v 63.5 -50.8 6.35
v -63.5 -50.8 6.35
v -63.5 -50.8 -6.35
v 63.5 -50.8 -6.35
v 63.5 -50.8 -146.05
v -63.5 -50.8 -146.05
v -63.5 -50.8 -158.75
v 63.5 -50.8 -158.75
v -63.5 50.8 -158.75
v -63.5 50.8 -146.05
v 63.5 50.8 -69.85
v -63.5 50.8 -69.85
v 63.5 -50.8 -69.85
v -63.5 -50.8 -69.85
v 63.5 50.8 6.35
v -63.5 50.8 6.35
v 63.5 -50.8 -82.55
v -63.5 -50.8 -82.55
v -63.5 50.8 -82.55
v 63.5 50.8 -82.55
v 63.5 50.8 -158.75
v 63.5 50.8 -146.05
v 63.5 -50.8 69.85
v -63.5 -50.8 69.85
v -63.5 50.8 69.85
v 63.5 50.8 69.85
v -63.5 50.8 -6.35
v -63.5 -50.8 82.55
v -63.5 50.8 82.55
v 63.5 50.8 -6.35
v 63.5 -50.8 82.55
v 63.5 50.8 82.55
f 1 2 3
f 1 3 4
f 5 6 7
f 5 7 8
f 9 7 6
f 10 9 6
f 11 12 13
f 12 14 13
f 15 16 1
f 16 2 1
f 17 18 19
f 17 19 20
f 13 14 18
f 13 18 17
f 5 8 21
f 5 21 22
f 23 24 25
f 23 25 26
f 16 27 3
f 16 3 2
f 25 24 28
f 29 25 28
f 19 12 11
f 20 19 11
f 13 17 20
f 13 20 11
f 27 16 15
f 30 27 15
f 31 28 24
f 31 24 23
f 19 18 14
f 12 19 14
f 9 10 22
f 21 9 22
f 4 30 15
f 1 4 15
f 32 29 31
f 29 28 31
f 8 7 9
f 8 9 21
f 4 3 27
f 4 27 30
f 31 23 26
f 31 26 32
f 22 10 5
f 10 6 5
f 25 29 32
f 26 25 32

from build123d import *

# Parameters (mm, degrees)
F0_W     = 127
F0_H     = 12.7
F1_DEPTH = 50.8


# Not quite as in the source:
# - the program builds the solid bodies; features that only make, move or delete a surface that nothing else refers to are left out


with BuildPart() as f1:
    # F0 (on Front) → F1 (new body, symmetric)
    with BuildSketch(Plane.XZ):
        with Locations((0, 76.2)):
            Rectangle(F0_W, F0_H)
    extrude(amount=F1_DEPTH, both=True)


with BuildPart() as f1b:
    # F0 (on Front) → F1, piece 2 (new body, symmetric)
    with BuildSketch(Plane.XZ):
        Rectangle(F0_W, F0_H)
    extrude(amount=F1_DEPTH, both=True)


with BuildPart() as f1c:
    # F0 (on Front) → F1, piece 3 (new body, symmetric)
    with BuildSketch(Plane.XZ):
        with Locations((0, -76.2)):
            Rectangle(F0_W, F0_H)
    extrude(amount=F1_DEPTH, both=True)


with BuildPart() as f1d:
    # F0 (on Front) → F1, piece 4 (new body, symmetric)
    with BuildSketch(Plane.XZ):
        with Locations((0, -152.4)):
            Rectangle(F0_W, F0_H)
    extrude(amount=F1_DEPTH, both=True)


solid = Compound([f1.part, f1b.part, f1c.part, f1d.part])
